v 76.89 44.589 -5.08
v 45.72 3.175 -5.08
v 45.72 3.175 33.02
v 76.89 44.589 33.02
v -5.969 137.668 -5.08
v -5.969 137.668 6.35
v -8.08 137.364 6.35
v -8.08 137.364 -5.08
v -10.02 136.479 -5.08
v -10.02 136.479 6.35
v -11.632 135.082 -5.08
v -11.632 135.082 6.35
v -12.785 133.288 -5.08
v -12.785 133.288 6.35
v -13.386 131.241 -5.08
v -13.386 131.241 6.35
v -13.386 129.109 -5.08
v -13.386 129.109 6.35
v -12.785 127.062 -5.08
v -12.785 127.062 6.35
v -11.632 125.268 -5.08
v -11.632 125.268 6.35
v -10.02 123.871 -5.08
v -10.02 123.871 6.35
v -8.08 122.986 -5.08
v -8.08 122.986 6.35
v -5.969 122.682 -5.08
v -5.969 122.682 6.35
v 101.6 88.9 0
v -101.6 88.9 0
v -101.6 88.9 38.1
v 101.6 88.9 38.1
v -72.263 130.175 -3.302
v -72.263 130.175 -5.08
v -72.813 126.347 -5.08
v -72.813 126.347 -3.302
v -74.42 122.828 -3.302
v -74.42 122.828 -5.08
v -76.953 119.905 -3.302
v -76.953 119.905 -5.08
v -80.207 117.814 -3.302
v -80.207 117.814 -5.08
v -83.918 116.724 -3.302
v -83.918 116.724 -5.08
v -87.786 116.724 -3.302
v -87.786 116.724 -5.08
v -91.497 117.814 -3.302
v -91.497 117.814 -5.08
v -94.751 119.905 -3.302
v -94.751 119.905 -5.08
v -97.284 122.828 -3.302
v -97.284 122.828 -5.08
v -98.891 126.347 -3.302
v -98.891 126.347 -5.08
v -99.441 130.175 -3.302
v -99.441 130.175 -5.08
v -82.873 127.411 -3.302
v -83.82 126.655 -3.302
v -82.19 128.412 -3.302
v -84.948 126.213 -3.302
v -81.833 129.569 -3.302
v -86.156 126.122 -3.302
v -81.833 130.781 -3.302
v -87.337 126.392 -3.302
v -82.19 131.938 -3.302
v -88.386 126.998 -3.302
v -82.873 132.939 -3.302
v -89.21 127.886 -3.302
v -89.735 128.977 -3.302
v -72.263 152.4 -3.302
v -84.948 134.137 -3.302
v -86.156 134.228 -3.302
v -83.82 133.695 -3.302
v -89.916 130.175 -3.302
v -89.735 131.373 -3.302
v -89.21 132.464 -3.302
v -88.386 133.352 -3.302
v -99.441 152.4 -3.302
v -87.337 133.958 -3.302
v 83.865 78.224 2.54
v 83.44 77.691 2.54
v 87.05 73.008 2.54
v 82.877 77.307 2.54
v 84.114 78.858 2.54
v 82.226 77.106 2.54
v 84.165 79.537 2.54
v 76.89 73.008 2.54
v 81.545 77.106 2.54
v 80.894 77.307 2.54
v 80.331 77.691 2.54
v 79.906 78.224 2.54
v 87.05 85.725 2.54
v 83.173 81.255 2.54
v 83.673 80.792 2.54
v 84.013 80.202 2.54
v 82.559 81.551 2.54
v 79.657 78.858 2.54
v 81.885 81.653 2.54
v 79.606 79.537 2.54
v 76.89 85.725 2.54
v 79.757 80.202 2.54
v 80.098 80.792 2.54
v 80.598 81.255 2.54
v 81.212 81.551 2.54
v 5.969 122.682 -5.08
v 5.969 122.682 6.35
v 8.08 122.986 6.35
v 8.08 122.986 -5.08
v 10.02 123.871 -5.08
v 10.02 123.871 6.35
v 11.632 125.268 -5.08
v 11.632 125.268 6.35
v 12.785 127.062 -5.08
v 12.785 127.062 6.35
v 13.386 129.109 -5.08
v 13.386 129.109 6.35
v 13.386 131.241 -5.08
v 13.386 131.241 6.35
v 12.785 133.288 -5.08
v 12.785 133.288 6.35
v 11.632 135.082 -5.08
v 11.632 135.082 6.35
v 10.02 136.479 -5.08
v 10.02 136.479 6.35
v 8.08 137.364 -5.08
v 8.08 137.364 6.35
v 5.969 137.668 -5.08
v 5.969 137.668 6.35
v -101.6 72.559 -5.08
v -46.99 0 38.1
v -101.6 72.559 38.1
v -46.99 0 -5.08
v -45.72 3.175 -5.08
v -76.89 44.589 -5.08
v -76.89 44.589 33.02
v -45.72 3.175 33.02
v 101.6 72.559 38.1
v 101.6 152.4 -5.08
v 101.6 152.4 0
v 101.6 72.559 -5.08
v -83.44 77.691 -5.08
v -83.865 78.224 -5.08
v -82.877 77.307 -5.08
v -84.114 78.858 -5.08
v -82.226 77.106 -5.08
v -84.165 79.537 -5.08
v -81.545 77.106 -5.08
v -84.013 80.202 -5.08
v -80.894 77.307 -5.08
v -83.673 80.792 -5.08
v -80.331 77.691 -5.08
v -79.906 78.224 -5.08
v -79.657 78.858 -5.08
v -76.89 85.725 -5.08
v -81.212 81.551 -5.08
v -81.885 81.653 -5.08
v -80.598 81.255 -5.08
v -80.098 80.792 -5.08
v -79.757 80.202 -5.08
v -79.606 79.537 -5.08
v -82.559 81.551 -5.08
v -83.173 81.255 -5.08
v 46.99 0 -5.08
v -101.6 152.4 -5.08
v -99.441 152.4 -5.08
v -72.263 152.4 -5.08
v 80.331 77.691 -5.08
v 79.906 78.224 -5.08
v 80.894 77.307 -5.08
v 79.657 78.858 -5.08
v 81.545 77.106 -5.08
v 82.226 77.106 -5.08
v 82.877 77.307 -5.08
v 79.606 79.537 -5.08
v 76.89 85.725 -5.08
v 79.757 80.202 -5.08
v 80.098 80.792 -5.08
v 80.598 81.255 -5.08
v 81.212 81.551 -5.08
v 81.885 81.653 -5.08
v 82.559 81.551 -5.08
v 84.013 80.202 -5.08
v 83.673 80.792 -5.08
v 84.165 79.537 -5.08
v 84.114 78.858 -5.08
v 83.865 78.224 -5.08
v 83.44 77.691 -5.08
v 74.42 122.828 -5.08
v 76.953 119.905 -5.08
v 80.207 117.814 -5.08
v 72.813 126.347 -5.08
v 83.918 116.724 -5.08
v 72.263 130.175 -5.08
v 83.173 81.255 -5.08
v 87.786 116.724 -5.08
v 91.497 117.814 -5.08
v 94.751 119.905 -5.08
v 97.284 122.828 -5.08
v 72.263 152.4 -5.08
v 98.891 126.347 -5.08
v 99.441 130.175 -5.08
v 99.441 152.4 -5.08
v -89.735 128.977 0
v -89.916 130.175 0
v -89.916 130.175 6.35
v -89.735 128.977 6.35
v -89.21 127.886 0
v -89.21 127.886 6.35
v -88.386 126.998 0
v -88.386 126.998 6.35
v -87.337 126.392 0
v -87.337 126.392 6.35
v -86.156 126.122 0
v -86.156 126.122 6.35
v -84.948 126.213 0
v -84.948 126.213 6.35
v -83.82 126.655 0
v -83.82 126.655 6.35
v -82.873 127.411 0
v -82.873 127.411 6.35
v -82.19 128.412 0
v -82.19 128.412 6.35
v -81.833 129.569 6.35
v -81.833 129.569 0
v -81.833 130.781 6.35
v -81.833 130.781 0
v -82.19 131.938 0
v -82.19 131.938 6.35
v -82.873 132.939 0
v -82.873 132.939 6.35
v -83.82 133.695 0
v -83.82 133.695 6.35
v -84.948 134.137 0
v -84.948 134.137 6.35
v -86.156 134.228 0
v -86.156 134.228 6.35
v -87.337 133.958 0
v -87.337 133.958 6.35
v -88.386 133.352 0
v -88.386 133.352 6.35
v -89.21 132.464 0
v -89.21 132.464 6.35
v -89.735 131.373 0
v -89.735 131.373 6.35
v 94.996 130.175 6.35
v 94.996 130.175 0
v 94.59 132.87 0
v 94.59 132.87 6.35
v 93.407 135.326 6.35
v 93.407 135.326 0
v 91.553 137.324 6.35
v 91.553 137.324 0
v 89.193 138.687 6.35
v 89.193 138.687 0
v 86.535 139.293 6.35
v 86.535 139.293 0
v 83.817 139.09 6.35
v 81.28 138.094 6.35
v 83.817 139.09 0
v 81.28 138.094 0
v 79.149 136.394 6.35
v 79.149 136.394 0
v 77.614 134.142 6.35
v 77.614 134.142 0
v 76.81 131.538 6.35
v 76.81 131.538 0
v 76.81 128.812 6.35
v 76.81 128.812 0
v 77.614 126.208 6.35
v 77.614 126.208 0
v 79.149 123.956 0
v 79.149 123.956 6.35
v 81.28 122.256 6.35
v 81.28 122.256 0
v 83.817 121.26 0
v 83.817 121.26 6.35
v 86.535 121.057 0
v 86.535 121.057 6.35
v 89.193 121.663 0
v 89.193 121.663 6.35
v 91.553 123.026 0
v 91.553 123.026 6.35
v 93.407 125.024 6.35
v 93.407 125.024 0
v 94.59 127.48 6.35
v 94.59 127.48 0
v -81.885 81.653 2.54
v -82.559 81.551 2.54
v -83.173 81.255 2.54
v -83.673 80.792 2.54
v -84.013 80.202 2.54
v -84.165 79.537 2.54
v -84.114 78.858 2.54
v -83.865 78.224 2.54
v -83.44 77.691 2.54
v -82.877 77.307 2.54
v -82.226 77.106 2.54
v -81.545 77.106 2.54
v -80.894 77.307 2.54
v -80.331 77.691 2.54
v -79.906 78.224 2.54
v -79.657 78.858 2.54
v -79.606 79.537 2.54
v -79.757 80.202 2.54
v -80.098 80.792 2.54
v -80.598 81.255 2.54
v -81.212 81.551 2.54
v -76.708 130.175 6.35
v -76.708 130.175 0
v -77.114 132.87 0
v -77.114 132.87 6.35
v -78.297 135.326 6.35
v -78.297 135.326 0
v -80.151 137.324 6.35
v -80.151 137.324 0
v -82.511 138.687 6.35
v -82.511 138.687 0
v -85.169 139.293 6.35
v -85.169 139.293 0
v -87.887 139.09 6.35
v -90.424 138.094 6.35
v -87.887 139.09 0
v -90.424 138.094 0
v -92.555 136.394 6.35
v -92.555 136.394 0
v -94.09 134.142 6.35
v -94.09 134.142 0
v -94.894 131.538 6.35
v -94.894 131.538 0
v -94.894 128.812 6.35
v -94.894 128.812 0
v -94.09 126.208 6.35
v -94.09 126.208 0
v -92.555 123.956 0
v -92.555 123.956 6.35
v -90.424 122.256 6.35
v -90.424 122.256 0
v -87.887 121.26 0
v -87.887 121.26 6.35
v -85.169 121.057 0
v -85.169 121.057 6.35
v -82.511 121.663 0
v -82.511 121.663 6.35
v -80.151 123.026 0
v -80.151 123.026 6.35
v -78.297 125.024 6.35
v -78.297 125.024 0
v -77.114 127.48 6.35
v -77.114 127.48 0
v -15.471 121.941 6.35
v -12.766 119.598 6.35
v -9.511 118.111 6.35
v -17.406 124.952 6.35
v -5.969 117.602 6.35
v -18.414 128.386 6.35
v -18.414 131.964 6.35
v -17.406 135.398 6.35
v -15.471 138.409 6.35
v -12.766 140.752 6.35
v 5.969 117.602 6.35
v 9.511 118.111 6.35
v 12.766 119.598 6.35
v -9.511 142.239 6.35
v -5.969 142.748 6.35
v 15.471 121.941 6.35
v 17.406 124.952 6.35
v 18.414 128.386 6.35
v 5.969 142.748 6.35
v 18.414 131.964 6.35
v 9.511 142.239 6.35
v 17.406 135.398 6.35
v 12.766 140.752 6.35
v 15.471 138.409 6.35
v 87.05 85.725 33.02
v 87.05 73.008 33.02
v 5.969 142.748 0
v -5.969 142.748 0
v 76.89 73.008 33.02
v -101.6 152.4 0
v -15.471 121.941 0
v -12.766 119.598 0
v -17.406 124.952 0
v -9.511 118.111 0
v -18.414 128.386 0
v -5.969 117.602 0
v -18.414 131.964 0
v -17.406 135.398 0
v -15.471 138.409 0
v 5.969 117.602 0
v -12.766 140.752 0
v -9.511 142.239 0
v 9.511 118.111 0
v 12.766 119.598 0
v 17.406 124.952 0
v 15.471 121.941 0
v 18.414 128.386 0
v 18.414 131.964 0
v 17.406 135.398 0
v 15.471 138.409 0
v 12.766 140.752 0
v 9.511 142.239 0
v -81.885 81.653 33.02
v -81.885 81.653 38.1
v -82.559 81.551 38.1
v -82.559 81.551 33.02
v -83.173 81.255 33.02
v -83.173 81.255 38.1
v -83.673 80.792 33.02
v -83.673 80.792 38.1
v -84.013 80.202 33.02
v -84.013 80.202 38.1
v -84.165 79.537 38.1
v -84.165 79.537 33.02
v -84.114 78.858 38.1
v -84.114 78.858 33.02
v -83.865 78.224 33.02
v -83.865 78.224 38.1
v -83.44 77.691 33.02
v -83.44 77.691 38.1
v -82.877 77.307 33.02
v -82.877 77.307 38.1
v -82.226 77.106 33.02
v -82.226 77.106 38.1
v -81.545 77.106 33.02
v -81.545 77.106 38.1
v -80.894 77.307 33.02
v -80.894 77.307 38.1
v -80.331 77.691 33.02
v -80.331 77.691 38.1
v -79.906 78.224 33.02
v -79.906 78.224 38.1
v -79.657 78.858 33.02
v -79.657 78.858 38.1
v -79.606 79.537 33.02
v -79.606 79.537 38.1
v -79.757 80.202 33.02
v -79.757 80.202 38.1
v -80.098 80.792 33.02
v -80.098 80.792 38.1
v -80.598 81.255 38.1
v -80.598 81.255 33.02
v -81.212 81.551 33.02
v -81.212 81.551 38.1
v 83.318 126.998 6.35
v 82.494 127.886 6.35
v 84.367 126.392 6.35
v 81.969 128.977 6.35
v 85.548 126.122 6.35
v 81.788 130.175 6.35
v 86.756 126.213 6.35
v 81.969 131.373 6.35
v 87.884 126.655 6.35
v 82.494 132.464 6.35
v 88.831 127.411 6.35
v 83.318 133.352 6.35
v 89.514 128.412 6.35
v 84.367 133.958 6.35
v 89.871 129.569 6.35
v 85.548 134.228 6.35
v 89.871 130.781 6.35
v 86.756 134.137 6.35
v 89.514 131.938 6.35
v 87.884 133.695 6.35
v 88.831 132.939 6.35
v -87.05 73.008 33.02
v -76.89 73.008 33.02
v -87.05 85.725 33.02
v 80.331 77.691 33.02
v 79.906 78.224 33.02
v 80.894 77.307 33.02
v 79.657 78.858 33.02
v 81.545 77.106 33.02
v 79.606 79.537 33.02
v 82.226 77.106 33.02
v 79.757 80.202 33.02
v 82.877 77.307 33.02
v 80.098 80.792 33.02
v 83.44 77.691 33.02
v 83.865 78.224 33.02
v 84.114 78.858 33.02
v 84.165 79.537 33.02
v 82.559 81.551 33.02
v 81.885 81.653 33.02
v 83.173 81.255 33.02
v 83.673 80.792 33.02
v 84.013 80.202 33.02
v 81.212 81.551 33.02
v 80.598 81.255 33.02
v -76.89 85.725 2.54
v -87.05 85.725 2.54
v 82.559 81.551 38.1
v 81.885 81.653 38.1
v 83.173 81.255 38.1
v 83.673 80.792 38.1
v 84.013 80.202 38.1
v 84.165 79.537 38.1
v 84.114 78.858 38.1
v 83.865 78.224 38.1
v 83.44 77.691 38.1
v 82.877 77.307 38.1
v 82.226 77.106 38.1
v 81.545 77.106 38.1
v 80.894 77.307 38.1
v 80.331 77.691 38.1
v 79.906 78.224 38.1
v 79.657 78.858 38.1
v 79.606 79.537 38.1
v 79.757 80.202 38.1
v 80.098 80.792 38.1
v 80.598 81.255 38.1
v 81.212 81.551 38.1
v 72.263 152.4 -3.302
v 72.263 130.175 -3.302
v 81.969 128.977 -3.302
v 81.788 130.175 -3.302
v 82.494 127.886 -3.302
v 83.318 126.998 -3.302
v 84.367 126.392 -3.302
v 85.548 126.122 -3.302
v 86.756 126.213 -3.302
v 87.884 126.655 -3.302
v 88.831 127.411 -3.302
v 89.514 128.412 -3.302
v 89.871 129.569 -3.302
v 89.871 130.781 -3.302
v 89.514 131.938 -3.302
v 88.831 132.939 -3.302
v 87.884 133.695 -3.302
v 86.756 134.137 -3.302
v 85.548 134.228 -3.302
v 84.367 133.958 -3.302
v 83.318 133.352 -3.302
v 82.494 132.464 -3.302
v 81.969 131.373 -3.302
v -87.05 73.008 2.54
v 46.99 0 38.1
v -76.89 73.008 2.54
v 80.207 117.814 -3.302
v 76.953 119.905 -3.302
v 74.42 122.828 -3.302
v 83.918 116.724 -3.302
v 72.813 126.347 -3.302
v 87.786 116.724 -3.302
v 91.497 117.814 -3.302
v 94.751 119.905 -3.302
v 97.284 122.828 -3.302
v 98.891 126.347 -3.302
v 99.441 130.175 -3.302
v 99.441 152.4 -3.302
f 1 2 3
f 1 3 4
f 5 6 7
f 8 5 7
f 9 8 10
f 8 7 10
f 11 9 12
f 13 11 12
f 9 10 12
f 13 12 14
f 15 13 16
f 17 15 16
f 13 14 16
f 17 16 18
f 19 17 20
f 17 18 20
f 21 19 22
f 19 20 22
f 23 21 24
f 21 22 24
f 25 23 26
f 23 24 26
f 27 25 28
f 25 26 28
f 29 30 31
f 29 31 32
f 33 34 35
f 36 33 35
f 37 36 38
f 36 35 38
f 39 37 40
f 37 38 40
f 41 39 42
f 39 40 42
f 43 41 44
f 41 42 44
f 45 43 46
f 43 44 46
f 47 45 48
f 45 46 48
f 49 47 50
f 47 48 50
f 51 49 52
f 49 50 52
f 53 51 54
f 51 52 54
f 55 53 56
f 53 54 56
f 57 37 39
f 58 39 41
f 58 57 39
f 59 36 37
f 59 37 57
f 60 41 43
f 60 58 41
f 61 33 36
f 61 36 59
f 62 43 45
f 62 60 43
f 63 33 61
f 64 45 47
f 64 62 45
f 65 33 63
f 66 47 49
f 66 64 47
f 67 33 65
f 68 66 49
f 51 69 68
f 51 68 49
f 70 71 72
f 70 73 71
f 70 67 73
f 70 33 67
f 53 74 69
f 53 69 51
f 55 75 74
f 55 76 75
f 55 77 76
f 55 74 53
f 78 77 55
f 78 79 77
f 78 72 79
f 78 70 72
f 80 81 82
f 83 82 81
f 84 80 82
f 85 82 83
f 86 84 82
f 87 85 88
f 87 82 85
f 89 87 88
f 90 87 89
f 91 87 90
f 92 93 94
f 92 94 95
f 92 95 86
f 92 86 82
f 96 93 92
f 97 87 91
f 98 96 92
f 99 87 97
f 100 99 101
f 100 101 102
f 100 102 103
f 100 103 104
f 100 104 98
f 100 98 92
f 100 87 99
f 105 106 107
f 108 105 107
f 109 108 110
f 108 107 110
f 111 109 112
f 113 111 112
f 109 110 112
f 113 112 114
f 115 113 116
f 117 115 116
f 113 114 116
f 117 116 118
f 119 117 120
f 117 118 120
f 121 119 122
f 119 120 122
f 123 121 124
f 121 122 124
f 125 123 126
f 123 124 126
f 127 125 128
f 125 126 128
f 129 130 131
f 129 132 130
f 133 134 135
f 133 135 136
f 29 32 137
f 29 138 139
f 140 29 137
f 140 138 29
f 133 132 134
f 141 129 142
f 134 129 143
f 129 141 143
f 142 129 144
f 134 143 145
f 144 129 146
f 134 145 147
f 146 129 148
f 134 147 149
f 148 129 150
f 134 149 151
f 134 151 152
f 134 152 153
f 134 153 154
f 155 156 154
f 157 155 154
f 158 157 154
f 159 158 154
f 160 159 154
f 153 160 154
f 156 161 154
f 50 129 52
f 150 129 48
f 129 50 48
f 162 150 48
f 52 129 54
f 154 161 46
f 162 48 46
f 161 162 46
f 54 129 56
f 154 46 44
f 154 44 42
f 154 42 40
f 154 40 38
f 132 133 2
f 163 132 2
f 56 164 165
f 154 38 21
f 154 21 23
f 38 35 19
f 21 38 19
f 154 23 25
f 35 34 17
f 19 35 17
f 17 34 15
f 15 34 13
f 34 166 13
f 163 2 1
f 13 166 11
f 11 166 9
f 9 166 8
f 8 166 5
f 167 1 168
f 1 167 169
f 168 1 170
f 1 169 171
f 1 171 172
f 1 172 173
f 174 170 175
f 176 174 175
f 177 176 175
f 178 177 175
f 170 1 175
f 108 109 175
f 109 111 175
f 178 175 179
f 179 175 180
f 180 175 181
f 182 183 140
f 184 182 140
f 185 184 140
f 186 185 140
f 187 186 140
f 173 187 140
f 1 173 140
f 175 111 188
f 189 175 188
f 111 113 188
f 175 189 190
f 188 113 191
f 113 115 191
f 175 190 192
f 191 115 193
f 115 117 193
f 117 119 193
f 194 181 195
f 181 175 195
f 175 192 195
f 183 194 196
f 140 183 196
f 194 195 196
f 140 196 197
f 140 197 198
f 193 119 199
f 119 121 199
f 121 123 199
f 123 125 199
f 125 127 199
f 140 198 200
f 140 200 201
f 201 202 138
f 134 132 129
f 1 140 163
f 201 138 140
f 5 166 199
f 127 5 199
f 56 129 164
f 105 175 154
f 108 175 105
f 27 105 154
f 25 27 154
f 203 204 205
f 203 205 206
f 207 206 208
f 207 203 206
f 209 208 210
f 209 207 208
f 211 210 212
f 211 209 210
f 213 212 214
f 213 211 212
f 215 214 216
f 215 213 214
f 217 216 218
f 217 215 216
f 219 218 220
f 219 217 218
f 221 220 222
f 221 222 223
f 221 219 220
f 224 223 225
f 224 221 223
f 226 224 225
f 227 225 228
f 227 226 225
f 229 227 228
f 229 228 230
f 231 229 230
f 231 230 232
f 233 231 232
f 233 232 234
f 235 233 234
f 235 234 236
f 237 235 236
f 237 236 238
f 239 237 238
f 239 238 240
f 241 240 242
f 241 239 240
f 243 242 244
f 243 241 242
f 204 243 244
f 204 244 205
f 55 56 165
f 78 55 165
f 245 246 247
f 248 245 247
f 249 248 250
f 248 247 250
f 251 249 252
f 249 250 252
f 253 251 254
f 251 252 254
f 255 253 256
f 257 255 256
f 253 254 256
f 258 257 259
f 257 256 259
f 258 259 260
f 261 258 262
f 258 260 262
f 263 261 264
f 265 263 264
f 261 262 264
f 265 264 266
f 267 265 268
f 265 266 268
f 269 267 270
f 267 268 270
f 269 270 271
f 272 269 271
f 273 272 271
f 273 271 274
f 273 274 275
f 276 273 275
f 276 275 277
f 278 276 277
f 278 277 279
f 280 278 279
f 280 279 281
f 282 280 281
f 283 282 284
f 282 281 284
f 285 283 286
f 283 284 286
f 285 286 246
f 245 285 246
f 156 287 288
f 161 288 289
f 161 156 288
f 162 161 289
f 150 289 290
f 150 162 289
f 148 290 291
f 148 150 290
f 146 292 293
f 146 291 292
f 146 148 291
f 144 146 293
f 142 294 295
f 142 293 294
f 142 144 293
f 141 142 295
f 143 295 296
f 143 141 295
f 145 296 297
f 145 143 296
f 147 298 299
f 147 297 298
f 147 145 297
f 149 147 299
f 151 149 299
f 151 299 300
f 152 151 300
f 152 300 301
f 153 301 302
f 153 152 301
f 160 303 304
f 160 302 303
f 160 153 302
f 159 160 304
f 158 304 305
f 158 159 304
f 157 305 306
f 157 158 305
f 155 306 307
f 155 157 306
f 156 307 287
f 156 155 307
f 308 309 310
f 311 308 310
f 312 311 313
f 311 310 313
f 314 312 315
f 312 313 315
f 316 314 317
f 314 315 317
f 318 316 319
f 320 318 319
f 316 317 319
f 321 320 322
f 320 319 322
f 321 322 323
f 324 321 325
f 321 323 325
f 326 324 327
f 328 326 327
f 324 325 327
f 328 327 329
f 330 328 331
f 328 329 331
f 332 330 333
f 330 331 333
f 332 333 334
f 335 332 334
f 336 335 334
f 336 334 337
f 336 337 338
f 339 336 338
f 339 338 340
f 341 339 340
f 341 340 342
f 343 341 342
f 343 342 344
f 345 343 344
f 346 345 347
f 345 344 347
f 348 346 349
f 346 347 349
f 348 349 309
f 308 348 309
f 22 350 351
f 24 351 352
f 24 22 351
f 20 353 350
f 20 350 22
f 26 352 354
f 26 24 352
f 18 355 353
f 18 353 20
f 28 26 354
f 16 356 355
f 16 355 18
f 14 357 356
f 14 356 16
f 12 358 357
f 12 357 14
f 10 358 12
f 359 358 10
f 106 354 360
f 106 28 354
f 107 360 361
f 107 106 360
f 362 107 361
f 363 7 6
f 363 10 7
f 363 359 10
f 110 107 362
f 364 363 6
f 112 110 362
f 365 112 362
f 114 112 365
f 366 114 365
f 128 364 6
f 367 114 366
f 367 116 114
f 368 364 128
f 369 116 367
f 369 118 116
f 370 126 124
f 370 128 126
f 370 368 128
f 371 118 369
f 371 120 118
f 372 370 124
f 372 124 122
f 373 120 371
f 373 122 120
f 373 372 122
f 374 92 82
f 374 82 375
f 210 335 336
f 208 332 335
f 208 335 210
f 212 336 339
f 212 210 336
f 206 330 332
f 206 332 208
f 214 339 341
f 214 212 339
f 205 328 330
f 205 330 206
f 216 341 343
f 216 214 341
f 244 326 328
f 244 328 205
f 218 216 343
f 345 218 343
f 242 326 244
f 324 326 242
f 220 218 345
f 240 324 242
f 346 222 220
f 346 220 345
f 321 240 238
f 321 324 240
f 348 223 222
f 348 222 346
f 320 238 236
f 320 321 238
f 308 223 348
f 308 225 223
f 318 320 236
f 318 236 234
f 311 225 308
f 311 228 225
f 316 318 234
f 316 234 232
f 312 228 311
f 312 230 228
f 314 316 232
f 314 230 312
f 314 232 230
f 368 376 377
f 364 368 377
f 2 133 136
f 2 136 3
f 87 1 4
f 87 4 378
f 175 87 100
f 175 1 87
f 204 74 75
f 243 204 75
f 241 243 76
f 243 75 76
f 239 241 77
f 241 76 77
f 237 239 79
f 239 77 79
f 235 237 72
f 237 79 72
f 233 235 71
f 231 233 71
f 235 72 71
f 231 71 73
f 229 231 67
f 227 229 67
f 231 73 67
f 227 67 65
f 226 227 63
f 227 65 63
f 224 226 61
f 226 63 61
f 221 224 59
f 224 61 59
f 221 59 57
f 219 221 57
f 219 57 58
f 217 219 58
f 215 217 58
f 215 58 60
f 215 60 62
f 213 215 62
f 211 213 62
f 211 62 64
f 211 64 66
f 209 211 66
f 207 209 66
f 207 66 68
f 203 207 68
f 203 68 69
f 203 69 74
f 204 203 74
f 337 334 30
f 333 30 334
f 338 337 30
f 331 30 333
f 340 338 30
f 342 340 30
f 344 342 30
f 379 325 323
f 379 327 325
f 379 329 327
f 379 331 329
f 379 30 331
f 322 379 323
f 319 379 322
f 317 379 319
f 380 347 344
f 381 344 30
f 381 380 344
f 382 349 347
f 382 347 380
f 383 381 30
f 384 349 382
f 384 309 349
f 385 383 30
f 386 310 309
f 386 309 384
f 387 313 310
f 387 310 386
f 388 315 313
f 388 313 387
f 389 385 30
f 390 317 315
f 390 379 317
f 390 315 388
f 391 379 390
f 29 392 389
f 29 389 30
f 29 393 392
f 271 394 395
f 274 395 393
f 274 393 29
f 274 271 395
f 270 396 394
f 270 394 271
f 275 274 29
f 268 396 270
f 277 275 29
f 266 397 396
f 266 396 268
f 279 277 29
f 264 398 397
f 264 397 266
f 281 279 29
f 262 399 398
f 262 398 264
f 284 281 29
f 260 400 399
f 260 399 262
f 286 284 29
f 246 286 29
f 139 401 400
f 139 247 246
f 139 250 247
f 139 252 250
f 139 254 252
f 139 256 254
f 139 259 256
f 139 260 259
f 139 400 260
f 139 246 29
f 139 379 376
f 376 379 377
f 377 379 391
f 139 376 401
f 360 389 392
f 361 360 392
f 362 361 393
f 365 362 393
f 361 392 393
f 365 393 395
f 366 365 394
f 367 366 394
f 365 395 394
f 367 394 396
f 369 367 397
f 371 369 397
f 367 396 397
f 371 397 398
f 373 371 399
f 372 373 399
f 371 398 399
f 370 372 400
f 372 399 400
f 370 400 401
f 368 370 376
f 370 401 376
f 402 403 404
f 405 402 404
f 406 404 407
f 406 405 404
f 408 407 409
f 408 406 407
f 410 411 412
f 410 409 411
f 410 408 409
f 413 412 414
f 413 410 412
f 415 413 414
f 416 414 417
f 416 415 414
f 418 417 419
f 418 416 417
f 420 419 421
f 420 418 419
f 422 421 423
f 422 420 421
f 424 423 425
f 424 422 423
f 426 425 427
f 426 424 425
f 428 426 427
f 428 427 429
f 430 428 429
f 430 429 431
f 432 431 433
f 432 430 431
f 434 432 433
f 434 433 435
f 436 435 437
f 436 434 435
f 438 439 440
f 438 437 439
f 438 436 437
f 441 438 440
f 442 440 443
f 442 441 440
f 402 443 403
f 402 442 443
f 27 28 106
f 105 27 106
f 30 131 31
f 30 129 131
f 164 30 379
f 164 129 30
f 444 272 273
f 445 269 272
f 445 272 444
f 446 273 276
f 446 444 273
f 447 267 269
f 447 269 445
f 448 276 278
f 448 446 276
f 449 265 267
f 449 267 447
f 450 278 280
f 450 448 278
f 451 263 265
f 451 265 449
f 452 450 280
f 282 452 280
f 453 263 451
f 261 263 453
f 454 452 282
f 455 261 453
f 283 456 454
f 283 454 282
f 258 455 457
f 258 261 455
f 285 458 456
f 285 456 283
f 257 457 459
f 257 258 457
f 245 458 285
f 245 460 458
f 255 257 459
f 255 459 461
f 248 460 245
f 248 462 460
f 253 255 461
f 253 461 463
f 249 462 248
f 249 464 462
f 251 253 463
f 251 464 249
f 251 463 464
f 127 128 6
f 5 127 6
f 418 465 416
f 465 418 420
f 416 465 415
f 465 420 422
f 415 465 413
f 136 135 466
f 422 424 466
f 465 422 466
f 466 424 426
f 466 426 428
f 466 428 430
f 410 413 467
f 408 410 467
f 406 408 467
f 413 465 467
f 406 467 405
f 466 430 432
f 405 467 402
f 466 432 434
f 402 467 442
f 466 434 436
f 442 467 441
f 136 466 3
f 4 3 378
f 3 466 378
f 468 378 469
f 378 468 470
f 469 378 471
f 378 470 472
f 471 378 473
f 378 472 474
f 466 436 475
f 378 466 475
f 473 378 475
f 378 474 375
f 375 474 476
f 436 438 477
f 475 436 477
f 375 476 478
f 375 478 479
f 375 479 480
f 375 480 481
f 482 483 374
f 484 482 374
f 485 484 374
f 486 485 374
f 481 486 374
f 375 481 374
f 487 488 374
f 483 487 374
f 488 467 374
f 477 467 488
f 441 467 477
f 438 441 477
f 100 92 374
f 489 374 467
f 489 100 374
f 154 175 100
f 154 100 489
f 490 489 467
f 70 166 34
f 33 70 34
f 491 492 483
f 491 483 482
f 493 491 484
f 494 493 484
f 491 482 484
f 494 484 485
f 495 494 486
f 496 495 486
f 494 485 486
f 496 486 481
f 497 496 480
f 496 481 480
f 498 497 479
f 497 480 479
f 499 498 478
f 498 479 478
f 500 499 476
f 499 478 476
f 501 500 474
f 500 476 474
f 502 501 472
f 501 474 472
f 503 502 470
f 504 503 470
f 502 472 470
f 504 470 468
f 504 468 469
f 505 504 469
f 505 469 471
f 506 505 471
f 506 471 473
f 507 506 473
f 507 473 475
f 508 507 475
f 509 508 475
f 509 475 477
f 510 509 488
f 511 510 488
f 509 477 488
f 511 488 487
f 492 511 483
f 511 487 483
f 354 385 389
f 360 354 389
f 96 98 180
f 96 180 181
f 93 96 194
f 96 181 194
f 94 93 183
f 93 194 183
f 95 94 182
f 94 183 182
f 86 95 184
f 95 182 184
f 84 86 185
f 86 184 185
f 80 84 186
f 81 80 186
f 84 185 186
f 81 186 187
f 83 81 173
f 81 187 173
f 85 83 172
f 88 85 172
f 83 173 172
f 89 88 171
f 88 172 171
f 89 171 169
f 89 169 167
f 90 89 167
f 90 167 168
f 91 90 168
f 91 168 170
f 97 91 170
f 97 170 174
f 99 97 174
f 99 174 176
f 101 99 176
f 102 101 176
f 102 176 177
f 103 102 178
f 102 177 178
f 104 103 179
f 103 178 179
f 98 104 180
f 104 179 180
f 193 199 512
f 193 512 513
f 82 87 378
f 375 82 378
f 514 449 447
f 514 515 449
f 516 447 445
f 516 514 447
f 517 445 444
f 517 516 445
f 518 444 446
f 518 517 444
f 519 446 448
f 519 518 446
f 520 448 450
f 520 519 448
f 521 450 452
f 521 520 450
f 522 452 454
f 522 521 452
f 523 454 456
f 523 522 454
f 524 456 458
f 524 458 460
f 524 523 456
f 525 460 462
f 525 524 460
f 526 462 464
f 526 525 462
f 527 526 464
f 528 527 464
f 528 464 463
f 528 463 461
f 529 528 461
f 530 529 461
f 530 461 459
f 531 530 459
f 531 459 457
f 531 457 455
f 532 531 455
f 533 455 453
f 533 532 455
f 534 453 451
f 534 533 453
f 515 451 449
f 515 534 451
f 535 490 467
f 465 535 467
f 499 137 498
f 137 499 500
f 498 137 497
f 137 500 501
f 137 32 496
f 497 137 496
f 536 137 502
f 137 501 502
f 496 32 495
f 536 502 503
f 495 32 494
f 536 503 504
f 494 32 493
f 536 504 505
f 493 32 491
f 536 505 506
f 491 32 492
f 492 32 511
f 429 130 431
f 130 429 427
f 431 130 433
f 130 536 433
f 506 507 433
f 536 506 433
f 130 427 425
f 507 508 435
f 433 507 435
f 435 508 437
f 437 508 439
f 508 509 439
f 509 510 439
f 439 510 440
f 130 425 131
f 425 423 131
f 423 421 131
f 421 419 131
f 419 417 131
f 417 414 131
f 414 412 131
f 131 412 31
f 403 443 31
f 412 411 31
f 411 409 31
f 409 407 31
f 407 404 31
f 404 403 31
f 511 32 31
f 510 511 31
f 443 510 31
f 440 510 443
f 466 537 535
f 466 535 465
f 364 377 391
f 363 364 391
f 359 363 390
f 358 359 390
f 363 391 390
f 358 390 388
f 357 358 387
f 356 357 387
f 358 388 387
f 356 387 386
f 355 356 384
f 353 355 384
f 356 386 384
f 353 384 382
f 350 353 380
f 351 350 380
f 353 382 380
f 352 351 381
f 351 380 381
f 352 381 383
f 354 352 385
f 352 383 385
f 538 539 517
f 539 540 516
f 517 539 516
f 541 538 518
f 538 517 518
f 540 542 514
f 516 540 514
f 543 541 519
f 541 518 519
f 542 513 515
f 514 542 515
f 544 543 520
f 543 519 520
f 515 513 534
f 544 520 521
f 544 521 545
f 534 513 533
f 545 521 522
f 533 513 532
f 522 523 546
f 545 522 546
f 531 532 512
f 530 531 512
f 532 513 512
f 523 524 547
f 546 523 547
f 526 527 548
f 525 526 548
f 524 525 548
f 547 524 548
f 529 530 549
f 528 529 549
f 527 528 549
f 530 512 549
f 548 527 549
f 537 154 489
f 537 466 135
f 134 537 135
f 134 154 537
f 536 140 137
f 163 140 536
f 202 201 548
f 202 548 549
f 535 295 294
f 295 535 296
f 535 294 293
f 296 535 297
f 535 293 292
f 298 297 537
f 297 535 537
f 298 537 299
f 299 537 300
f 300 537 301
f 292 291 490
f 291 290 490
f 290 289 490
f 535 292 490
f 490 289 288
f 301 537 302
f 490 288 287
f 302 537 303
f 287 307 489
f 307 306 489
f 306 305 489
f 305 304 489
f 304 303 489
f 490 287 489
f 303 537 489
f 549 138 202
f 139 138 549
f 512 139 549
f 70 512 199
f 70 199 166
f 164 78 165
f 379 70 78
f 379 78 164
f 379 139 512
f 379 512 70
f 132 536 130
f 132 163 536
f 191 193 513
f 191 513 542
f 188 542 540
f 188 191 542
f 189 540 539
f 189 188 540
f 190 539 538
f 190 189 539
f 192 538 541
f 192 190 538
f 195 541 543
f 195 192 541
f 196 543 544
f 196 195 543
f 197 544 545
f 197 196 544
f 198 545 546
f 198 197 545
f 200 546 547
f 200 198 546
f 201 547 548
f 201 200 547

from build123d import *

# Parameters (mm, degrees)
BASE_FLANGE1_DEPTH           = 5.08
OG_POCKET_DEPTH              = 38.1
SHELL_OF_POCKET_DEPTH        = 38.1
BATTERY_TAIL_HOLE_DEPTH      = 189.182975851
BATTERY_TAIL_HOLE_DEPTH_BACK = 189.182975851
SKETCH11_R                   = 4.064
TAB_BOLT_HOLES_DEPTH         = 189.182975851
SKETCH12_W                   = 30.48
SKETCH12_H                   = 12.716912384
WEIGHT_SAVER_DEPTH           = 10.16
SKETCH13_R                   = 2.286
BOLT_HOLES_THROUGH_DEPTH     = 189.182975851
CUT_EXTRUDE6_DEPTH           = 1.778
POSSIBLE_LIP_R               = 9.144
POSSIBLE_LIP_R_2             = 4.064
BATTERY_LIP_DEPTH            = 6.35


# Sheet-metal steps are written as plain solids
with BuildPart() as part:
    # Sketch1 → Base-Flange1 (new body)
    with BuildSketch(Plane.XY):
        Polygon((0, 0), (46.99, 0), (101.6, 72.558989745), (101.6, 152.4), (-101.6, 152.4), (-101.6, 72.558989745), (-46.99, 0), align=None)
    extrude(amount=-BASE_FLANGE1_DEPTH)

    # Sketch6 → OG Pocket (add)
    with BuildSketch(Plane.XY):
        Polygon((-101.6, 72.558989745), (-101.6, 88.9), (101.6, 88.9), (101.6, 72.558989745), (46.99, 0), (-46.99, 0), align=None)
    extrude(amount=OG_POCKET_DEPTH)

    # Sketch9 → Shell of Pocket (cut)
    with BuildSketch(Plane(origin=(0, 0, -5.08), x_dir=(-1, 0, 0), z_dir=(0, 0, -1))):
        Polygon((-76.889615099, 44.589315736), (-76.889615099, 85.725), (76.889615099, 85.725), (76.889615099, 44.589315736), (45.72, 3.175), (-45.72, 3.175), align=None)
    extrude(amount=-SHELL_OF_POCKET_DEPTH, mode=Mode.SUBTRACT)

    # Sketch10 → Battery Tail Hole (cut, two sides: drawn at the far end of the back side and taken through both)
    with BuildSketch(Plane(origin=(0, 0, -5.08), x_dir=(-1, 0, 0), z_dir=(0, 0, -1)).offset(-BATTERY_TAIL_HOLE_DEPTH_BACK)):
        with BuildLine():
            Line((-5.969, 137.668), (5.969, 137.668))
            ThreePointArc((5.969, 137.668), (13.462, 130.175), (5.969, 122.682))
            Line((5.969, 122.682), (-5.969, 122.682))
            ThreePointArc((-5.969, 122.682), (-13.462, 130.175), (-5.969, 137.668))
        make_face()
    extrude(amount=BATTERY_TAIL_HOLE_DEPTH + BATTERY_TAIL_HOLE_DEPTH_BACK, mode=Mode.SUBTRACT)

    # Sketch11 → Tab Bolt Holes (cut, through all)
    with BuildSketch(Plane(origin=(0, 0, -5.08), x_dir=(-1, 0, 0), z_dir=(0, 0, -1))):
        with Locations((-85.852, 130.175)):
            Circle(SKETCH11_R)
        with Locations((85.852, 130.175)):
            Circle(SKETCH11_R)
    extrude(amount=-TAB_BOLT_HOLES_DEPTH, mode=Mode.SUBTRACT)

    # Sketch12 → Weight Saver (cut)
    with BuildSketch(Plane.ZY.offset(-76.889615099)):
        with Locations((17.78, 79.366543808)):
            Rectangle(SKETCH12_W, SKETCH12_H)
    weight_saver = extrude(amount=-WEIGHT_SAVER_DEPTH, mode=Mode.SUBTRACT)

    # Mirror1: Weight Saver across plane
    add(weight_saver.mirror(Plane(origin=(0, 0, 0), x_dir=(0, 0, 1), z_dir=(1, 0, 0))), mode=Mode.SUBTRACT)

    # Sketch13 → Bolt holes- Through (cut, symmetric)
    with BuildSketch(Plane(origin=(0, 0, -5.08), x_dir=(-1, 0, 0), z_dir=(0, 0, -1))):
        with Locations(Location((-81.885444711, 79.366543808, 0), (0, 0, 90))):
            Circle(SKETCH13_R)
    bolt_holes_through = extrude(amount=BOLT_HOLES_THROUGH_DEPTH, both=True, mode=Mode.SUBTRACT)

    # Mirror2: Bolt holes- Through across plane
    add(bolt_holes_through.mirror(Plane(origin=(0, 0, 0), x_dir=(0, 0, 1), z_dir=(1, 0, 0))), mode=Mode.SUBTRACT)

    # Sketch14 → Cut-Extrude6 (cut)
    with BuildSketch(Plane(origin=(0, 0, -5.08), x_dir=(-1, 0, 0), z_dir=(0, 0, -1))):
        with BuildLine():
            Line((72.263, 152.4), (72.263, 130.175))
            ThreePointArc((72.263, 130.175), (85.852, 116.586), (99.441, 130.175))
            Line((99.441, 130.175), (99.441, 152.4))
            Line((99.441, 152.4), (72.263, 152.4))
        make_face()
    cut_extrude6 = extrude(amount=-CUT_EXTRUDE6_DEPTH, mode=Mode.SUBTRACT)

    # Mirror3: Cut-Extrude6 across plane
    add(cut_extrude6.mirror(Plane(origin=(0, 0, 0), x_dir=(0, 0, 1), z_dir=(1, 0, 0))), mode=Mode.SUBTRACT)

    # Possible Lip → Battery Lip (add)
    # profile 1 of 3: a face of its own
    with BuildSketch(Plane.XY):
        with Locations((85.852, 130.175)):
            Circle(POSSIBLE_LIP_R)
        with Locations(Location((85.852, 130.175, 0), (0, 0, 180))):
            Circle(POSSIBLE_LIP_R_2, mode=Mode.SUBTRACT)
    # profile 2 of 3: a face of its own
    with BuildSketch(Plane.XY):
        with Locations((-85.852, 130.175)):
            Circle(POSSIBLE_LIP_R)
        with Locations(Location((-85.852, 130.175, 0), (0, 0, 180))):
            Circle(POSSIBLE_LIP_R_2, mode=Mode.SUBTRACT)
    # profile 3 of 3: a face of its own
    with BuildSketch(Plane.XY):
        with BuildLine():
            Line((-5.969, 117.602), (5.969, 117.602))
            ThreePointArc((5.969, 117.602), (18.542, 130.175), (5.969, 142.748))
            Line((5.969, 142.748), (-5.969, 142.748))
            ThreePointArc((-5.969, 142.748), (-18.542, 130.175), (-5.969, 117.602))
        make_face()
        with BuildLine():
            Line((-5.969, 122.682), (5.969, 122.682))
            ThreePointArc((5.969, 122.682), (13.462, 130.175), (5.969, 137.668))
            Line((5.969, 137.668), (-5.969, 137.668))
            ThreePointArc((-5.969, 137.668), (-13.462, 130.175), (-5.969, 122.682))
        make_face(mode=Mode.SUBTRACT)
    extrude(amount=BATTERY_LIP_DEPTH)


solid = part.part
